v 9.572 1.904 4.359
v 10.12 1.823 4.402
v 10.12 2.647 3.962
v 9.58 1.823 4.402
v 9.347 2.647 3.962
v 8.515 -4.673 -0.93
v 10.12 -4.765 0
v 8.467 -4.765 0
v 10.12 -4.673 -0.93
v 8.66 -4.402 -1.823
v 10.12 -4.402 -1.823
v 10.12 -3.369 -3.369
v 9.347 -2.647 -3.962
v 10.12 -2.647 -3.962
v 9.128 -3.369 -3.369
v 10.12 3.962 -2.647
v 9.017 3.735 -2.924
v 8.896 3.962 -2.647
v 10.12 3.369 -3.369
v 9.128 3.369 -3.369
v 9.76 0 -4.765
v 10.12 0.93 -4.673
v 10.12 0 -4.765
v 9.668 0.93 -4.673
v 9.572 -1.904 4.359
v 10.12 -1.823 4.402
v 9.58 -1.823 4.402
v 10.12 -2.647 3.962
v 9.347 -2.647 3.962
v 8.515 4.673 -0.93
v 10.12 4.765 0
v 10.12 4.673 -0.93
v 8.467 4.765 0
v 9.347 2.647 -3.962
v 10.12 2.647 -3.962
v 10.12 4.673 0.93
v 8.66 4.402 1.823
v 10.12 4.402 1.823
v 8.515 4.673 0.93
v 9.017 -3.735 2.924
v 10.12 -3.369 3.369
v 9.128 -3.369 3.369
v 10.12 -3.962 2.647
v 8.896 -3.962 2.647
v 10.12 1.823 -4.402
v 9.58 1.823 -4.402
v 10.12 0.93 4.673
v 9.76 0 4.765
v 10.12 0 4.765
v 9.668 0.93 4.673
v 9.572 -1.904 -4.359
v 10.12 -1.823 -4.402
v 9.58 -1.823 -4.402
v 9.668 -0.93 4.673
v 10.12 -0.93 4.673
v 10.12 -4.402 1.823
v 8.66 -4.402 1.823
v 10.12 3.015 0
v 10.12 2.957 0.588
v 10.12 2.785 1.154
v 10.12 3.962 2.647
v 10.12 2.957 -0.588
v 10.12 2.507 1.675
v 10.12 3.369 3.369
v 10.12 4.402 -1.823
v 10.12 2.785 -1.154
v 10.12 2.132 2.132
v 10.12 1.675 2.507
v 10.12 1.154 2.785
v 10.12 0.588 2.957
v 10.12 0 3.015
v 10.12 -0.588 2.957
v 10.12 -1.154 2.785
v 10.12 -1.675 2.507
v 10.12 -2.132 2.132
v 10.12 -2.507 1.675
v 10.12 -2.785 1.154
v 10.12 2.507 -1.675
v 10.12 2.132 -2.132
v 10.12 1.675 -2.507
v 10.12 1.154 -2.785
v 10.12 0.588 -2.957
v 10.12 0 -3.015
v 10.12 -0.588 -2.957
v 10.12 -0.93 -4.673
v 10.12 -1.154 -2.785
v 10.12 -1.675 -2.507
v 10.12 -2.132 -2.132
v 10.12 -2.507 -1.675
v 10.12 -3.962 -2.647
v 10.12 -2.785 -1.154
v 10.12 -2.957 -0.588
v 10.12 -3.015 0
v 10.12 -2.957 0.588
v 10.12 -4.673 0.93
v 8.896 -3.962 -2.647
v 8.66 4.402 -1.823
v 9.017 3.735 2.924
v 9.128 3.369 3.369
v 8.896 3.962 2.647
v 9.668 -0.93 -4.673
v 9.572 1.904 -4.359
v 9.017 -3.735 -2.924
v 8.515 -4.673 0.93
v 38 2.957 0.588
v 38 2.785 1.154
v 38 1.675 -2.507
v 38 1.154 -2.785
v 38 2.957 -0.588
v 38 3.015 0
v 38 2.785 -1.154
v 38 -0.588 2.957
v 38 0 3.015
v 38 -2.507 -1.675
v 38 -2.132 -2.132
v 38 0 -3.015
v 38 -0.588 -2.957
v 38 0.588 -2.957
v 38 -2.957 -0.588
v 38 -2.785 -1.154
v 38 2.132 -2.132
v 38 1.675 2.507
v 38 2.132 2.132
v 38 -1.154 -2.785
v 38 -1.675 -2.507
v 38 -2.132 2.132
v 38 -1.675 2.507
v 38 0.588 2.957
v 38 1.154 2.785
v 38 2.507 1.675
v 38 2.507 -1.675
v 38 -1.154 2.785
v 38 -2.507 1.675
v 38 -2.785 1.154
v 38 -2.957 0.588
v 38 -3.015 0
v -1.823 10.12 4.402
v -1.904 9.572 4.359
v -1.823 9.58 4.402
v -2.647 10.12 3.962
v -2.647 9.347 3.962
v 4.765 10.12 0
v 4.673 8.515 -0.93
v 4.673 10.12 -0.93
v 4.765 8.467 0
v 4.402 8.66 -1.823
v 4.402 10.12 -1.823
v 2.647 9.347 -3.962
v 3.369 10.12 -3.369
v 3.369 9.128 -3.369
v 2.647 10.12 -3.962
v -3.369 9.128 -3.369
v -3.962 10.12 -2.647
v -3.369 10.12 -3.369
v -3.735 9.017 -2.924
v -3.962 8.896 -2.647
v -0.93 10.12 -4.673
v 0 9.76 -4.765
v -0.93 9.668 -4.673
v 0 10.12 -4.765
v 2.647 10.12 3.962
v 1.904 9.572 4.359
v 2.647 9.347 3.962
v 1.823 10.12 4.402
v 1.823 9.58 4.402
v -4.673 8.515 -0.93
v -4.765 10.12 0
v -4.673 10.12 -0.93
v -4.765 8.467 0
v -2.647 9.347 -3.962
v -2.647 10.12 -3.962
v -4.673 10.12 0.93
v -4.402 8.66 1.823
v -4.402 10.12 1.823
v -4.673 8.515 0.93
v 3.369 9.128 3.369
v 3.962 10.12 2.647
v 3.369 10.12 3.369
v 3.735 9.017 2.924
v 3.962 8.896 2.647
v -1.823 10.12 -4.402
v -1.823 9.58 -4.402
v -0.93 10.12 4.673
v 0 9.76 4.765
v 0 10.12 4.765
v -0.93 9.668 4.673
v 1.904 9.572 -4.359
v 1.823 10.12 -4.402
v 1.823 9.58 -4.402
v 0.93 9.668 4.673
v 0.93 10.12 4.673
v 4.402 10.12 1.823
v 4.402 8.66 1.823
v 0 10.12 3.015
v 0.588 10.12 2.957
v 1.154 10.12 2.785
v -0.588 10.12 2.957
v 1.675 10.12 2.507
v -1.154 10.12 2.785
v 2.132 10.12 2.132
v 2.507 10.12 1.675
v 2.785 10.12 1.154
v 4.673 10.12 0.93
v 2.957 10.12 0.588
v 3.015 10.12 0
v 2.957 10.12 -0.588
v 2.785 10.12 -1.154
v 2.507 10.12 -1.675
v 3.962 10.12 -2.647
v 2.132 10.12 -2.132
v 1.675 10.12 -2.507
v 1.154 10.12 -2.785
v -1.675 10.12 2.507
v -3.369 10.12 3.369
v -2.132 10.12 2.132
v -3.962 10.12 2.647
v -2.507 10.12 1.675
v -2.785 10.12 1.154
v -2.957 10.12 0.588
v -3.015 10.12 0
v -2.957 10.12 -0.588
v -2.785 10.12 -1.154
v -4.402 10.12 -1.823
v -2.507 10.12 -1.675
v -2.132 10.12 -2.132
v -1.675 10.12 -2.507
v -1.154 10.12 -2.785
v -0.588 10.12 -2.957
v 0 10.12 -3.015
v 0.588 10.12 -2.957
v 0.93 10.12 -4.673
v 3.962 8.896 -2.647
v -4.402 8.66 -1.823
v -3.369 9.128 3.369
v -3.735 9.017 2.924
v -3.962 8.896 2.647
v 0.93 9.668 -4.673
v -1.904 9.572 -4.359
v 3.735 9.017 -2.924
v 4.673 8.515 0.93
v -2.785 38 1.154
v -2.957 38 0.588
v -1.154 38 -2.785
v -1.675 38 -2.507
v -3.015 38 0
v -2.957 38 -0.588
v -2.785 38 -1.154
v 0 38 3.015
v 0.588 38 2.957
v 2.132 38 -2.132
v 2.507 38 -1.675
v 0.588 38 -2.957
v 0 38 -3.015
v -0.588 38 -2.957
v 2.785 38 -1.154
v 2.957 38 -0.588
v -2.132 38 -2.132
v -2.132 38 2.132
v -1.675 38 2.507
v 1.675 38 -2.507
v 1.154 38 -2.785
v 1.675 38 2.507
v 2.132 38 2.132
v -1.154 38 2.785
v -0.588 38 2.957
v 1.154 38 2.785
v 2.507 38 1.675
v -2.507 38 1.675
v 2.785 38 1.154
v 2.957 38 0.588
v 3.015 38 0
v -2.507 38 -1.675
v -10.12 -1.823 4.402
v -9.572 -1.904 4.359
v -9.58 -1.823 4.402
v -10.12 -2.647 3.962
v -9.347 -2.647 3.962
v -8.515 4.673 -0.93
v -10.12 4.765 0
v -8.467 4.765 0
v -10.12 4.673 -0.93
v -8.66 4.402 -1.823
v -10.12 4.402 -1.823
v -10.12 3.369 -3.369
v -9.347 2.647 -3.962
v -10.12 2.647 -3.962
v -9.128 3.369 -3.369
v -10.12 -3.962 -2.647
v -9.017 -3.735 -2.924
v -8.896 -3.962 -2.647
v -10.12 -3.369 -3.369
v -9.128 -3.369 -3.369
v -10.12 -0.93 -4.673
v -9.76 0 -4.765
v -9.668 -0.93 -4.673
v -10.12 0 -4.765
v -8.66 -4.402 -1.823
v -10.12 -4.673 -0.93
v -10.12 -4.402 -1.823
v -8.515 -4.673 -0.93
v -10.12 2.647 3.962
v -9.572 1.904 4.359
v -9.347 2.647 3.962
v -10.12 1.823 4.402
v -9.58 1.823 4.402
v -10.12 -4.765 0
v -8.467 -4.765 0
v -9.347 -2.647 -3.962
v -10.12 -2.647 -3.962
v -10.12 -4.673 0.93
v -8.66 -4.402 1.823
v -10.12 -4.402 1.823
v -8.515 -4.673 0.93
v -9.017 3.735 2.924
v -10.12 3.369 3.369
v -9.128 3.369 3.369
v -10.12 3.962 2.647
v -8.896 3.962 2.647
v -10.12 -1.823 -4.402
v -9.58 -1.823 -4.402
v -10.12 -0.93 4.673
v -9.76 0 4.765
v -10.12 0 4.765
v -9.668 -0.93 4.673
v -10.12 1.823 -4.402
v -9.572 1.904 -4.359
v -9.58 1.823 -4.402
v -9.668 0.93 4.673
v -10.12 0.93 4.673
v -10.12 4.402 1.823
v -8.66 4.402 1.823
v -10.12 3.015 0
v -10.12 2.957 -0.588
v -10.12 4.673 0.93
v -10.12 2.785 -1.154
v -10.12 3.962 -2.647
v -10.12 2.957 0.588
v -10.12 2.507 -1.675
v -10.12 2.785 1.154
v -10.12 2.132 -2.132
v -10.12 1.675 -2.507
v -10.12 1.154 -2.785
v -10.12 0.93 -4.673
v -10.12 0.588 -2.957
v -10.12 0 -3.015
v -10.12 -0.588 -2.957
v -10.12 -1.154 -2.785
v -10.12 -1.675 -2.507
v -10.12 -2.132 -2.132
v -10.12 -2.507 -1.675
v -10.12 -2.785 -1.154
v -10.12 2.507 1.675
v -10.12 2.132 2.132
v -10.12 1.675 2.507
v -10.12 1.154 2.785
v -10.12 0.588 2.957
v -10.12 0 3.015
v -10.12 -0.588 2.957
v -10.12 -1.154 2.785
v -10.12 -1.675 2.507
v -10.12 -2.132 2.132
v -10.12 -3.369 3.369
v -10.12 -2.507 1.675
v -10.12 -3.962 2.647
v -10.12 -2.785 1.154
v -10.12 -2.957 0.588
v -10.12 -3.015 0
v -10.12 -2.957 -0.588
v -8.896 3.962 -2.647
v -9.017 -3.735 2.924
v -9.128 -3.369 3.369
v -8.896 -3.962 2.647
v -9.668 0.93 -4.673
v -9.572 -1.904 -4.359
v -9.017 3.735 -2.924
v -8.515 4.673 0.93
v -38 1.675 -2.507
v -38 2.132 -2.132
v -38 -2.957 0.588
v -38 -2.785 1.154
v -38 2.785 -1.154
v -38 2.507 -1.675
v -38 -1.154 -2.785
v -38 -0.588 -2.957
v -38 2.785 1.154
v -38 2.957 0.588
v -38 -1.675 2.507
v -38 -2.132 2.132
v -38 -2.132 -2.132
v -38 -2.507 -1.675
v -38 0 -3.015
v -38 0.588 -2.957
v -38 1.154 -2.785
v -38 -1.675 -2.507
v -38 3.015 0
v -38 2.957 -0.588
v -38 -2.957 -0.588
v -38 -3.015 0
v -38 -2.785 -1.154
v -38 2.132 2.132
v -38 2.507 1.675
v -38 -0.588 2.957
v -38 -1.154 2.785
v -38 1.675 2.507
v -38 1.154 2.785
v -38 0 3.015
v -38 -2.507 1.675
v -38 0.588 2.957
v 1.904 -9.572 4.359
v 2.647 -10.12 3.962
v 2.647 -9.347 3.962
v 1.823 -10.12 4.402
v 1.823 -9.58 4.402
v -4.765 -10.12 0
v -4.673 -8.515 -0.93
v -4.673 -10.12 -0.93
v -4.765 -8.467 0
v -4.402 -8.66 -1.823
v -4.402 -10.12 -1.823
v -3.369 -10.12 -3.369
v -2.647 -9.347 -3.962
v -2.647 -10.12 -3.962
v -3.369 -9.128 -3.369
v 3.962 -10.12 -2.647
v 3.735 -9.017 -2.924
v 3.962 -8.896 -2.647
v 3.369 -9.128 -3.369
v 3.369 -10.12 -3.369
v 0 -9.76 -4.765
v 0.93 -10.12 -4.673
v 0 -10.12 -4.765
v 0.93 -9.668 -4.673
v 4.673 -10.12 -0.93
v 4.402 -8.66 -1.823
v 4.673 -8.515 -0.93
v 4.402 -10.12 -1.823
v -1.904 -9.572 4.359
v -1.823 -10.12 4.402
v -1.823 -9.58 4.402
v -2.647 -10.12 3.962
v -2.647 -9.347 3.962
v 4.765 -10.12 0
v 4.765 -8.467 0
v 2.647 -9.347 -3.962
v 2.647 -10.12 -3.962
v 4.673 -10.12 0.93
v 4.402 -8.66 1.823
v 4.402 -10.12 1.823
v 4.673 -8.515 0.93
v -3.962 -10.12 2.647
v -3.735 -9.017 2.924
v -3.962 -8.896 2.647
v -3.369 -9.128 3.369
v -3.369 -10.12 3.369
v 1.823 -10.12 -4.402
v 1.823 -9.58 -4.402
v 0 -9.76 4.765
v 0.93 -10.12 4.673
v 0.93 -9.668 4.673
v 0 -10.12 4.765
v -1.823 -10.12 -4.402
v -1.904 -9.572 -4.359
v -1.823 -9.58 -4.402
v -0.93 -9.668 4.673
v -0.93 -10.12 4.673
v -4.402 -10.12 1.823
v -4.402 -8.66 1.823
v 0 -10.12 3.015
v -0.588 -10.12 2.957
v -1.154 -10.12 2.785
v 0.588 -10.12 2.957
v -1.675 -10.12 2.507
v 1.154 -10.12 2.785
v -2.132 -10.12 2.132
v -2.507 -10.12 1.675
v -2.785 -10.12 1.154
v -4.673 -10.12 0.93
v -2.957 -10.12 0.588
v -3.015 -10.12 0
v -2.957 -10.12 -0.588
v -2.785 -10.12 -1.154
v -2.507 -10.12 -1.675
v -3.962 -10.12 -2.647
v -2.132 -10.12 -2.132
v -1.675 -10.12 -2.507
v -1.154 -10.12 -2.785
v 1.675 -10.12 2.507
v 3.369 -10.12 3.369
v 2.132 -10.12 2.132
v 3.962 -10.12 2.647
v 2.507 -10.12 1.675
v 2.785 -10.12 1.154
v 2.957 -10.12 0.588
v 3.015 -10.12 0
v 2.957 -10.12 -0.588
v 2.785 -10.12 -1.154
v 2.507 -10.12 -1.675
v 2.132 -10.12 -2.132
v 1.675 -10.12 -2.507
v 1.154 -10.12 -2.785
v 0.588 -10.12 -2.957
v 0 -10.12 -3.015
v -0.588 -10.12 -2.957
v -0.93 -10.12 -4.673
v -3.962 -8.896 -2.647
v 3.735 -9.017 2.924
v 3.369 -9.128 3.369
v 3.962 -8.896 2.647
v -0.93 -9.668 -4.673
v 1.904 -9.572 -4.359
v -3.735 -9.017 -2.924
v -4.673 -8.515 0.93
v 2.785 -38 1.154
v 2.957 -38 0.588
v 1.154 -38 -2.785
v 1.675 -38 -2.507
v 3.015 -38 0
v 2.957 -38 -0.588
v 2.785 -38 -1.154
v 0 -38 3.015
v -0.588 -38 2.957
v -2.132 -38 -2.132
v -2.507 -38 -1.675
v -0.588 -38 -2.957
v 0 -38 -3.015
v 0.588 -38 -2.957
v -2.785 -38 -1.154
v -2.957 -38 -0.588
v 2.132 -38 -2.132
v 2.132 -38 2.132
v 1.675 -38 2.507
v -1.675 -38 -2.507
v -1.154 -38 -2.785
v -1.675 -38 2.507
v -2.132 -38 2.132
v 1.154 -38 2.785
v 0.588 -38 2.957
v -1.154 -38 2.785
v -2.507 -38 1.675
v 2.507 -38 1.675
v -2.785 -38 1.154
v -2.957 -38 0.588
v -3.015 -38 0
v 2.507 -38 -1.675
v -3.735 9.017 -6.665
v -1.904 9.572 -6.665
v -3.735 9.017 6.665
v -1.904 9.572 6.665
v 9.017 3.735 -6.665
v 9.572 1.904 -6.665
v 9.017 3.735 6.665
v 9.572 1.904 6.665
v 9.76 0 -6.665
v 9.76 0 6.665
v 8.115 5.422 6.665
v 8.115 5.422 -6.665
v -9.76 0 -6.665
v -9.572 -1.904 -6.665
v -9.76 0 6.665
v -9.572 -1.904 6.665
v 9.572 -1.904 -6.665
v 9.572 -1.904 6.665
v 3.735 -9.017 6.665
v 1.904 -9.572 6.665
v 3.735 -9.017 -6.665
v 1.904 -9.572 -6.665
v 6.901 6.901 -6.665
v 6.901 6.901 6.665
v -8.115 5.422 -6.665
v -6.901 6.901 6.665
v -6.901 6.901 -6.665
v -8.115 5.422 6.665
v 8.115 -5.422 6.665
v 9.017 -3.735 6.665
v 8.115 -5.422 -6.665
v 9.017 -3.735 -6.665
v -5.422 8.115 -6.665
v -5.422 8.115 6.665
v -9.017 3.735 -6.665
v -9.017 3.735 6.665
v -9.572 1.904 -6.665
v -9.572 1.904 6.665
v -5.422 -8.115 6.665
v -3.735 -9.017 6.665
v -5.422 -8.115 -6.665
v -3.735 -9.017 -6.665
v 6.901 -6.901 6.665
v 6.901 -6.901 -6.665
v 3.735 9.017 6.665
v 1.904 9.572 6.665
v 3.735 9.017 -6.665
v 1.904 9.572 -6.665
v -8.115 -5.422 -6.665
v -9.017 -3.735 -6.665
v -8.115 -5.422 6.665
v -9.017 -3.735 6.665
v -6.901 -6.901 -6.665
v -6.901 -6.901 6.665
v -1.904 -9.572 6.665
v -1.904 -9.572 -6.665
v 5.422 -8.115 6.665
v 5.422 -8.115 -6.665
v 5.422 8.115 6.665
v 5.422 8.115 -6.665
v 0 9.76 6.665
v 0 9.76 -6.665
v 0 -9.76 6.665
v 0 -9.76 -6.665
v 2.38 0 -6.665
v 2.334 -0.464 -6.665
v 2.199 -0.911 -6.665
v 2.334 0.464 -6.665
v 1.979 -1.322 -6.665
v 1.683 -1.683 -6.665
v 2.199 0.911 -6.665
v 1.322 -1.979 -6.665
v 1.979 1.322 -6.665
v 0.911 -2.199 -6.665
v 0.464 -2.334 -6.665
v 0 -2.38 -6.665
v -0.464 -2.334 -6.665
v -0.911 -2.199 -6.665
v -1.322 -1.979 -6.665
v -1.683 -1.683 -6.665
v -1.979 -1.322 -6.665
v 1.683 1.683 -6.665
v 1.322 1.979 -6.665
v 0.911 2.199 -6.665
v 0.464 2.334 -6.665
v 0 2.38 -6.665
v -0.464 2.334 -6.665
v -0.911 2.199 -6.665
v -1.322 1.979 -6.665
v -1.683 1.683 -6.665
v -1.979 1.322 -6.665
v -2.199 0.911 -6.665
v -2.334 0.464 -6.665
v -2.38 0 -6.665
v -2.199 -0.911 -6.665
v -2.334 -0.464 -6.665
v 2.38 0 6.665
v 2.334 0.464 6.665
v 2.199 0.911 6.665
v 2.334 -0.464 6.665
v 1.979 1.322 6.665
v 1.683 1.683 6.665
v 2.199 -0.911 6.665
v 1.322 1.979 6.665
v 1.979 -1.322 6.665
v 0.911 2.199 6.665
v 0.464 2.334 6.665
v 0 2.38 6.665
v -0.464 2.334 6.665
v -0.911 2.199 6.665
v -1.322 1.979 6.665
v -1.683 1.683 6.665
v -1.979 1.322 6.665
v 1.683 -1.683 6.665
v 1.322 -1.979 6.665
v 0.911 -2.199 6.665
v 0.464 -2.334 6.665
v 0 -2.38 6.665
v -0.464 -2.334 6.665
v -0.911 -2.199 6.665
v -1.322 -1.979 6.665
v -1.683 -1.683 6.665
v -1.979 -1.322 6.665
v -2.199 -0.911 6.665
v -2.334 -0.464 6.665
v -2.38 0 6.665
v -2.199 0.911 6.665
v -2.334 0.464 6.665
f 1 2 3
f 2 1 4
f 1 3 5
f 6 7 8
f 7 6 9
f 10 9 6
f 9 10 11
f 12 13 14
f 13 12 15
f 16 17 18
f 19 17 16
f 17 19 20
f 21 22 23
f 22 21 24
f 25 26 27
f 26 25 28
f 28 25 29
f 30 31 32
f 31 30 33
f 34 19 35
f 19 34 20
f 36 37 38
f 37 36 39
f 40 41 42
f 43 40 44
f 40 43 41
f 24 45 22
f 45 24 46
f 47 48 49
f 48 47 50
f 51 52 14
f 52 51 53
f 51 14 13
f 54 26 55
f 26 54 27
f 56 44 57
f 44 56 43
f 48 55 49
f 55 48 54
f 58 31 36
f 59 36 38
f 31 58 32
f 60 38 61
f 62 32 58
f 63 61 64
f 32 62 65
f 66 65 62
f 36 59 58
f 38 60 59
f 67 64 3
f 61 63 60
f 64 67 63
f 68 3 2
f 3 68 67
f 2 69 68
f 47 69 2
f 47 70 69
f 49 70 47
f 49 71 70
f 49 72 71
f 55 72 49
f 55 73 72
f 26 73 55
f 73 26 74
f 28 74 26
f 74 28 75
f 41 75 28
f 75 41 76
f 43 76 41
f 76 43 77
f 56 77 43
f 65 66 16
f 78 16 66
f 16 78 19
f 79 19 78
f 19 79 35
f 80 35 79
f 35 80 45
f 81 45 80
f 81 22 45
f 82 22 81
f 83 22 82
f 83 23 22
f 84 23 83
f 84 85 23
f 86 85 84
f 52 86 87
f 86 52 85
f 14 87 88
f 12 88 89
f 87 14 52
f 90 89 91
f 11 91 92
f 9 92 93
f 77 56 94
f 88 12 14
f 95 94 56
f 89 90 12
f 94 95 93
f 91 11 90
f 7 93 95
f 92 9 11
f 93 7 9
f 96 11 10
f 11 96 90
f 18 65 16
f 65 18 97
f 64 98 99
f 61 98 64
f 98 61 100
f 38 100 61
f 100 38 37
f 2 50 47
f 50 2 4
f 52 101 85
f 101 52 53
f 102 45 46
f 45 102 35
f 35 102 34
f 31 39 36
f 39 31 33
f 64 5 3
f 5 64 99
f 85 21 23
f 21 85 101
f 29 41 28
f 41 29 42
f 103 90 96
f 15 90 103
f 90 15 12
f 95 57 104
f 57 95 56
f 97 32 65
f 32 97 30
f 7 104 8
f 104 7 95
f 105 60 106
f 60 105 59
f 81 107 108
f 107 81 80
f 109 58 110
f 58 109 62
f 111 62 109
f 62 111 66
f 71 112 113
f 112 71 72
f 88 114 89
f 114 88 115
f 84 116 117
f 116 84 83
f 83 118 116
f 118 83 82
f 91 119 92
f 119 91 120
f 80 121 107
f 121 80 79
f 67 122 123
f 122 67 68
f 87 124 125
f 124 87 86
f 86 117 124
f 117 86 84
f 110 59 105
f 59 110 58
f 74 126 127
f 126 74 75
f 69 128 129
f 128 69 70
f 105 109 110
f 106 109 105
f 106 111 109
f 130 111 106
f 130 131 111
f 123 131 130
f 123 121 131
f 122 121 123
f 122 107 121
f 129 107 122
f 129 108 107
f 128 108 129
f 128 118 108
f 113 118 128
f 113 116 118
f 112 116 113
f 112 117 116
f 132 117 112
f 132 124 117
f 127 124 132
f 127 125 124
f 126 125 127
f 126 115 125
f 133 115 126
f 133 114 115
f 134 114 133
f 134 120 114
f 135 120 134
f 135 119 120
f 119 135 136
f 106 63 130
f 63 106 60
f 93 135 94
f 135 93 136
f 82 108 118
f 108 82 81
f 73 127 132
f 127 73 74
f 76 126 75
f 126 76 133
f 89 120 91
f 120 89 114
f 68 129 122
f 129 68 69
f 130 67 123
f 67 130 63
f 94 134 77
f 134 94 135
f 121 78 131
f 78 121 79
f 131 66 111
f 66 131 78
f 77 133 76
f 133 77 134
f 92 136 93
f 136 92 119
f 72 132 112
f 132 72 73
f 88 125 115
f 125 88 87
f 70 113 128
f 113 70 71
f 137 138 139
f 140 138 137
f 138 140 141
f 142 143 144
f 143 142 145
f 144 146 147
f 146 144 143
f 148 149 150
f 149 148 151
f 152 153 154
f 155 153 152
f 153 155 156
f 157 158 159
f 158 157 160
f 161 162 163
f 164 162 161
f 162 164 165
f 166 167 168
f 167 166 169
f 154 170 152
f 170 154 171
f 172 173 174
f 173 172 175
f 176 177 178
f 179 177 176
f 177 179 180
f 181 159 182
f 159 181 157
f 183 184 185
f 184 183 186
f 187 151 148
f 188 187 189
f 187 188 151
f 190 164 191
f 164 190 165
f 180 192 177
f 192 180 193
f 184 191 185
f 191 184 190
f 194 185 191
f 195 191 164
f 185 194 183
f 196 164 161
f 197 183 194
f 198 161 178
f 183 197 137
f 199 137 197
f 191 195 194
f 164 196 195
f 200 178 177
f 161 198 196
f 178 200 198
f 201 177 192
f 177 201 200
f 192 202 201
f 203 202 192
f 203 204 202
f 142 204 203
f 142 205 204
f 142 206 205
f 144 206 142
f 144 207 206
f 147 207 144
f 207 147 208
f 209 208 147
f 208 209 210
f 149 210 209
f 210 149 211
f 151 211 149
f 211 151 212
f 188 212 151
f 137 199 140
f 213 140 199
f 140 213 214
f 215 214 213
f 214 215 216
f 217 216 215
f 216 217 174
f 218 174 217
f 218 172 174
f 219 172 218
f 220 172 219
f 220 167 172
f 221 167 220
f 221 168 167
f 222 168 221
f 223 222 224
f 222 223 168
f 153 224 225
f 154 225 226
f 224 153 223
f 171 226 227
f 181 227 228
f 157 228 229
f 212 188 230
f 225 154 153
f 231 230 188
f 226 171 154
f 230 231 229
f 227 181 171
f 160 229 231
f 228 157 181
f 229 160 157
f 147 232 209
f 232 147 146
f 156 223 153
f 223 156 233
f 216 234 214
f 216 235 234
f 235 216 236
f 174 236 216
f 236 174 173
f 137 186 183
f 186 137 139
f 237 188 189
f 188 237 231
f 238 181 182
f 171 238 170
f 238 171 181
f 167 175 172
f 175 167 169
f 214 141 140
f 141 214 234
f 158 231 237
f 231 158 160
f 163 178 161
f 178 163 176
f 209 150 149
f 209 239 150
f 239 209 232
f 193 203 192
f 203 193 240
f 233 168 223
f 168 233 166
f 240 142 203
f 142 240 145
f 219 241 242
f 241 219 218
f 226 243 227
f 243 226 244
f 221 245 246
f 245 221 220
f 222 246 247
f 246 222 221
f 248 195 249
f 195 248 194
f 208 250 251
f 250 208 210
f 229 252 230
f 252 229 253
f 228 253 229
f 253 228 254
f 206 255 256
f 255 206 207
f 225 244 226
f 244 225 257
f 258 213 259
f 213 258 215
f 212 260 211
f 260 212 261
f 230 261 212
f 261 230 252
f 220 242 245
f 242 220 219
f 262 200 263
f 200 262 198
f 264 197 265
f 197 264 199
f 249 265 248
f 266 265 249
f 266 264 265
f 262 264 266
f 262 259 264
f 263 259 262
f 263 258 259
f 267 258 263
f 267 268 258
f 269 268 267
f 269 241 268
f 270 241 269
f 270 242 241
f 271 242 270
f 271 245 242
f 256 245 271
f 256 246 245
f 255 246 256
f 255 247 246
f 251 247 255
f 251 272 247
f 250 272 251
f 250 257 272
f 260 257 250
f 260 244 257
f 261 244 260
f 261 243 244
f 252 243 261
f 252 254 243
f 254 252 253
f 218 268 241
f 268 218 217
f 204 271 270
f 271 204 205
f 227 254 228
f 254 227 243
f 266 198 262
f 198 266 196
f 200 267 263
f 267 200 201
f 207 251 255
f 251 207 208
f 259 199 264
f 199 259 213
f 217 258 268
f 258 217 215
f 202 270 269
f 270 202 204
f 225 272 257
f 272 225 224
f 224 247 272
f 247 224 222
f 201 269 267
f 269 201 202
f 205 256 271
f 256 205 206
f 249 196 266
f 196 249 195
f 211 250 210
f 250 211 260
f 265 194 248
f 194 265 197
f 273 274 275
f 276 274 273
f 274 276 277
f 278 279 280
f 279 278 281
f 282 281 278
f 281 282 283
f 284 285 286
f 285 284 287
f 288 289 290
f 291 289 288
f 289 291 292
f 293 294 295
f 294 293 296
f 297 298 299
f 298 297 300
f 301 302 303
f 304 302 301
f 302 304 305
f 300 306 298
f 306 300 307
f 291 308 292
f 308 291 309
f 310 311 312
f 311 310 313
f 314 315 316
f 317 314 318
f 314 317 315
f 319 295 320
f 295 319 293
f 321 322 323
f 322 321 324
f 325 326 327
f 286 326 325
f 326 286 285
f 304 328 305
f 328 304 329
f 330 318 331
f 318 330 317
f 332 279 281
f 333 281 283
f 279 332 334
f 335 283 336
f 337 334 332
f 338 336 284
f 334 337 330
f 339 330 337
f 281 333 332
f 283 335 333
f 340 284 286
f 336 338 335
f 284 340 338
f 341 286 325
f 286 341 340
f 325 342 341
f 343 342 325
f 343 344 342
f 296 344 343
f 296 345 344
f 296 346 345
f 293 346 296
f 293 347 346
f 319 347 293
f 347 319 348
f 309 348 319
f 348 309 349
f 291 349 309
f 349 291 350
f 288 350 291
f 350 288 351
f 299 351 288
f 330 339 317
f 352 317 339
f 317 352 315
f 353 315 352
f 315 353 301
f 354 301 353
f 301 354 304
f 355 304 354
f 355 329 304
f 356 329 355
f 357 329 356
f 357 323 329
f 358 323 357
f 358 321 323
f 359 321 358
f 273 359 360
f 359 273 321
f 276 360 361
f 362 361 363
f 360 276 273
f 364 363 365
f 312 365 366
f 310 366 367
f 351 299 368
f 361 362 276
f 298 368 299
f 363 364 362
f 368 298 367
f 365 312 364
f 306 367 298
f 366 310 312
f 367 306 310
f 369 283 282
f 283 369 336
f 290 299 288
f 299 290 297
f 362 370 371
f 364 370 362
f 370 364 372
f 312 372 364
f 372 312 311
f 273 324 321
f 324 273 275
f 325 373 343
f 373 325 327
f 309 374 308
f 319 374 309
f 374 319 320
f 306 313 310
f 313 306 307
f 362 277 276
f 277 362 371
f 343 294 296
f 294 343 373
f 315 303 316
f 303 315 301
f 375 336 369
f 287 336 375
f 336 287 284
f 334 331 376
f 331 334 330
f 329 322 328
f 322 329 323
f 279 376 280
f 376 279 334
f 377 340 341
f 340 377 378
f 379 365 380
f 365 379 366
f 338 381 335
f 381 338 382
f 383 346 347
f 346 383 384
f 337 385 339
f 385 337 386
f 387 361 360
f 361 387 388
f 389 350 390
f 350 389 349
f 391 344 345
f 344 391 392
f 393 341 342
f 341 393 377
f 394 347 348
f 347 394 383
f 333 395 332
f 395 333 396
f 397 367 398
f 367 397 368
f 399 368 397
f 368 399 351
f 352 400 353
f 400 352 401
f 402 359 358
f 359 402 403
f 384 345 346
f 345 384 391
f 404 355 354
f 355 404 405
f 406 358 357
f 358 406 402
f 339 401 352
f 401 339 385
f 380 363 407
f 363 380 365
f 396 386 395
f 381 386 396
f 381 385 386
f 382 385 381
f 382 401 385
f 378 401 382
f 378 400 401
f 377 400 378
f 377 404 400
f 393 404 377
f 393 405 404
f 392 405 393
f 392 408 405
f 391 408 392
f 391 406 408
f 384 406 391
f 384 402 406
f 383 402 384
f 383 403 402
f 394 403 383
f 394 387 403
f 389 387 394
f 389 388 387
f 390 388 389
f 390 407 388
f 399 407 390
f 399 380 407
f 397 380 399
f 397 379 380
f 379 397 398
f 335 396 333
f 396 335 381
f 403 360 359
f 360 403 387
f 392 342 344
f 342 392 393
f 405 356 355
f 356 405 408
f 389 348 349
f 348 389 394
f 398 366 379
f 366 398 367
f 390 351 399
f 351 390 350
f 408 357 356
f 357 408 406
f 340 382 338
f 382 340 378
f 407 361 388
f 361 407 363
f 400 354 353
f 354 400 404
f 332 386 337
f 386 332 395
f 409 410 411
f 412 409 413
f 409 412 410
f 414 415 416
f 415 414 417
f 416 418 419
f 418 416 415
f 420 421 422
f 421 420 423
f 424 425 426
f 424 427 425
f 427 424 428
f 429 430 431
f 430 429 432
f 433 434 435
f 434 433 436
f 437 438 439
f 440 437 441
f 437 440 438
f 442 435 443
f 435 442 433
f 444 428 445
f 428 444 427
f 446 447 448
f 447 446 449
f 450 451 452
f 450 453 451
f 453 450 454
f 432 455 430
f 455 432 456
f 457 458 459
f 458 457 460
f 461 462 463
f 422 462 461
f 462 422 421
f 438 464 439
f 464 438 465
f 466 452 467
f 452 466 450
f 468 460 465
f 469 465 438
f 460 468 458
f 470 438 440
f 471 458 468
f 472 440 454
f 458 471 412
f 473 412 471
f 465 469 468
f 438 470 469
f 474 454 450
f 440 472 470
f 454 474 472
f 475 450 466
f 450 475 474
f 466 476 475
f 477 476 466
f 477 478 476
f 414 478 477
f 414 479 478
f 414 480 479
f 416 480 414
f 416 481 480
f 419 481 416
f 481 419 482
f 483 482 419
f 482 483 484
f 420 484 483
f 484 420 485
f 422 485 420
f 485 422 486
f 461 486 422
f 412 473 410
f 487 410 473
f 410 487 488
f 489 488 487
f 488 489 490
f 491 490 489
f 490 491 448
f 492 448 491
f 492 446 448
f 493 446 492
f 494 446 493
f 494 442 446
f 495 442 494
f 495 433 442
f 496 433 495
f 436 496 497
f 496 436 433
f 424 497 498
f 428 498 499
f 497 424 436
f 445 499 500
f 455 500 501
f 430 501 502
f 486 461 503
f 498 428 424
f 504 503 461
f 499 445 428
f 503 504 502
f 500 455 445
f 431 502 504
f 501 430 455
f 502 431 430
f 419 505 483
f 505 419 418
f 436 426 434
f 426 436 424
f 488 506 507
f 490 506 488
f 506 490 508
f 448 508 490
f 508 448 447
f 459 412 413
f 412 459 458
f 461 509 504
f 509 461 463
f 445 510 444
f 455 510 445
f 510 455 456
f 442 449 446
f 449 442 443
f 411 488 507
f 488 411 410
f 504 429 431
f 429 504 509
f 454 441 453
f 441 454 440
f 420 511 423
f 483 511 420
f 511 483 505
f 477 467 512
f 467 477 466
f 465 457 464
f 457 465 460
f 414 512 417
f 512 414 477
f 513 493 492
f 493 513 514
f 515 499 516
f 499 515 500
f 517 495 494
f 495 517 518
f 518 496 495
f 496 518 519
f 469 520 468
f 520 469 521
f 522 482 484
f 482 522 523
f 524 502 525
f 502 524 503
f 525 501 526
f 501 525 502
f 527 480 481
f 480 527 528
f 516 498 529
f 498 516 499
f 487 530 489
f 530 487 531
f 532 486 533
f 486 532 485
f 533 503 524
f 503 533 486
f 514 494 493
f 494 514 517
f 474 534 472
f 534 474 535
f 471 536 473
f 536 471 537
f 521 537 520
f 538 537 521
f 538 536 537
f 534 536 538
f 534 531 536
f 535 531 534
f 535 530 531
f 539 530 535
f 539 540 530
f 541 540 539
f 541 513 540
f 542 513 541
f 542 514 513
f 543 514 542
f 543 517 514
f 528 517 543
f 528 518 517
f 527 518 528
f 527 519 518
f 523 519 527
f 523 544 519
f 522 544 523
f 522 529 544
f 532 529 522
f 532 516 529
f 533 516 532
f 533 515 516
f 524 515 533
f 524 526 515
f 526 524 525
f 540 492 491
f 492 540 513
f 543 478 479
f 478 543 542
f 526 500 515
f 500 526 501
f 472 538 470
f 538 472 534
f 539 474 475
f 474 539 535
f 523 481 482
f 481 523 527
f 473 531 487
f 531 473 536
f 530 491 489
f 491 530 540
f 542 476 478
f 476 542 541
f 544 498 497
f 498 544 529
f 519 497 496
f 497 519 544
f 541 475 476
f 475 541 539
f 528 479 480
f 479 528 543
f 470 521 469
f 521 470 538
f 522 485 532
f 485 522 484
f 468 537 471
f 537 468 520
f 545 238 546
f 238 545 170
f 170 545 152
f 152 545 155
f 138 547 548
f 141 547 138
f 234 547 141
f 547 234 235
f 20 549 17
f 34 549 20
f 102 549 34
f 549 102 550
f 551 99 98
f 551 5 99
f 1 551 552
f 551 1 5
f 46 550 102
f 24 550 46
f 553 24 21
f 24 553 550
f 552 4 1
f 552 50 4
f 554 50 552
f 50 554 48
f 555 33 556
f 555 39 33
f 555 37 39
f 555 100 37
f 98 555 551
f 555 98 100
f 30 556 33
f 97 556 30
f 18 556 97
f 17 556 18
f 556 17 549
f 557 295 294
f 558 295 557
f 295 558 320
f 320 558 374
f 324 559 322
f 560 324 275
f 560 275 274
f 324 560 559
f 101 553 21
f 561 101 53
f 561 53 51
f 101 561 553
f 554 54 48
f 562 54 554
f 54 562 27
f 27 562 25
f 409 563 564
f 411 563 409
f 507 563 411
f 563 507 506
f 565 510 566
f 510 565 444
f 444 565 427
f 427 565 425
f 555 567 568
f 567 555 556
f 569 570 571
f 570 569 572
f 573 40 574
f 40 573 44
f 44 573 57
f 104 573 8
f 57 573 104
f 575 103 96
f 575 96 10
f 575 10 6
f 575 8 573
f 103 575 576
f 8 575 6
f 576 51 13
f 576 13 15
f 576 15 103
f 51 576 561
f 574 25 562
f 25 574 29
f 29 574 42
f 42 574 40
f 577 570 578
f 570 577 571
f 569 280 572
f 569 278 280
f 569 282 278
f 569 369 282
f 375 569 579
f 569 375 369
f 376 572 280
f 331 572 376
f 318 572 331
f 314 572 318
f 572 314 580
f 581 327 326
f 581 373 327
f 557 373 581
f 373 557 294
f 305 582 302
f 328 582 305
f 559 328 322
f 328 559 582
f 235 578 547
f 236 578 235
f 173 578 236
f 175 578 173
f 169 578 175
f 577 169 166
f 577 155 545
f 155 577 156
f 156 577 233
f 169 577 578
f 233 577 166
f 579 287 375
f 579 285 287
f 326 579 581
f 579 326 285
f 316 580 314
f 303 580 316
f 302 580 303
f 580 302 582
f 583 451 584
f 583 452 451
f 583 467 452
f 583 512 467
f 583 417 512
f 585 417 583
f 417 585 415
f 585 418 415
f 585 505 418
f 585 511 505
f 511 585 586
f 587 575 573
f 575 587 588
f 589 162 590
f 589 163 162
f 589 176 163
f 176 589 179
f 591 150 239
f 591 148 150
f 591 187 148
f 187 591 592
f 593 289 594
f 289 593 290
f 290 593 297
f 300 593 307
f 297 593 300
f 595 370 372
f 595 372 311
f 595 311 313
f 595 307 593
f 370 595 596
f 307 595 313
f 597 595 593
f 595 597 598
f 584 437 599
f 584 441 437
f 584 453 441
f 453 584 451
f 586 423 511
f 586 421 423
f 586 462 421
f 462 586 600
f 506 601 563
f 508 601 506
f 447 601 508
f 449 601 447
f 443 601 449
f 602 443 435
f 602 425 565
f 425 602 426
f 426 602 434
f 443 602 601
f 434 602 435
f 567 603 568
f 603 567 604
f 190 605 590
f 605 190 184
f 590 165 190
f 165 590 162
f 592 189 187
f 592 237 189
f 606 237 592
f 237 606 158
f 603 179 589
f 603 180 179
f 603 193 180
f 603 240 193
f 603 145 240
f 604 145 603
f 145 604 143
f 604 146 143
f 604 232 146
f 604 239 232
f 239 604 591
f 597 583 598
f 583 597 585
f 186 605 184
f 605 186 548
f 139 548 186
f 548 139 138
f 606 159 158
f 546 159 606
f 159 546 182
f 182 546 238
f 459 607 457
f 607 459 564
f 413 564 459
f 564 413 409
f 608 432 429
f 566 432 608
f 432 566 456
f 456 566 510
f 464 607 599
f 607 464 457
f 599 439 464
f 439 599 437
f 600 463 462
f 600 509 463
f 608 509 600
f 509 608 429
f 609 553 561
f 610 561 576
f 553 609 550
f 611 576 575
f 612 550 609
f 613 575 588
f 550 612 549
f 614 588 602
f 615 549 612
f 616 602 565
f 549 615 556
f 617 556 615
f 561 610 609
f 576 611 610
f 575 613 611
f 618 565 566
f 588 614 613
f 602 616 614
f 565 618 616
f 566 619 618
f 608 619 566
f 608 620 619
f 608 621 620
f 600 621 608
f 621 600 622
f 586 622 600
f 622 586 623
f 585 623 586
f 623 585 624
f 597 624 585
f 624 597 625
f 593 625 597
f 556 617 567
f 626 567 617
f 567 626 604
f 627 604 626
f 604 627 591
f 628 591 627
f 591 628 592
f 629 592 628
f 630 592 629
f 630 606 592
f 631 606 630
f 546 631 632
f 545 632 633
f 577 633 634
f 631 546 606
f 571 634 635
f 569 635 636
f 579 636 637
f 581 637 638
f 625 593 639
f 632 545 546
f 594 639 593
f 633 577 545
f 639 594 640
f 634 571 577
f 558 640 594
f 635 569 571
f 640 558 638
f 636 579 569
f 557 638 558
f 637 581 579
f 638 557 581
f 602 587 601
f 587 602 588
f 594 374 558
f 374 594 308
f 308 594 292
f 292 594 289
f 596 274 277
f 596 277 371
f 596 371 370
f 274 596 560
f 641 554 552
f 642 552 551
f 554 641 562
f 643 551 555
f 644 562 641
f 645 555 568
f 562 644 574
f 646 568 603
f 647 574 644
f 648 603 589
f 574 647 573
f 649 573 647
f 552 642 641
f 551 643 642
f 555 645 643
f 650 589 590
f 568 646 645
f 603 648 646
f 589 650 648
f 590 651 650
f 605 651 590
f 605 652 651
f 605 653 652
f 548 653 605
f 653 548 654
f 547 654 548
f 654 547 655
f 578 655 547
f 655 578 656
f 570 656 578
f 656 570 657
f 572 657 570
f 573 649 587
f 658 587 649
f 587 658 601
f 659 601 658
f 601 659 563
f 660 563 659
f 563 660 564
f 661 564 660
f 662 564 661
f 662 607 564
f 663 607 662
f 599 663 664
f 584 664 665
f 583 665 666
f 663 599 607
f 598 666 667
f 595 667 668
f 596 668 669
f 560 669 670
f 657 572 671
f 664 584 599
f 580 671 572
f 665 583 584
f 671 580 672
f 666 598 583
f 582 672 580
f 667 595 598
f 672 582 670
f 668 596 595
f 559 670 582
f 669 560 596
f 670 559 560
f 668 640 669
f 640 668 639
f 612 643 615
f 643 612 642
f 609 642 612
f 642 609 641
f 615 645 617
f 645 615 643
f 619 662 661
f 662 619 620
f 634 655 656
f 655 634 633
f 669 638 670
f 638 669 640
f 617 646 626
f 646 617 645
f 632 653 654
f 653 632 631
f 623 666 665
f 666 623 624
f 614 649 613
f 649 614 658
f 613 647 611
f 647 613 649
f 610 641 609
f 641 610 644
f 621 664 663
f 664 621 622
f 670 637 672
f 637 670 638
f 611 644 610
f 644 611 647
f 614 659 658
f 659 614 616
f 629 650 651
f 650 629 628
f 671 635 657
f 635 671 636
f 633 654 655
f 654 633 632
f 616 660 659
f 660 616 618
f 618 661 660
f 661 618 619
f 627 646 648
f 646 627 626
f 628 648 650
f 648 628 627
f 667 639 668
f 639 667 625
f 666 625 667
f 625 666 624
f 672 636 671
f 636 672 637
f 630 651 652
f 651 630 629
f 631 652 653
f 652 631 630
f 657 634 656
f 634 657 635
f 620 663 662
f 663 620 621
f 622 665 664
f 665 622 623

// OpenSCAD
$fn = 32;

// ----------------------------------------------------------------------
// Cardan cross: 76 mm span, 9.53 mm trunnions
// ----------------------------------------------------------------------

// --- parameters (mm) ---
journal_d = 9.53;         // trunnion diameter
arm_len = 38;             // trunnion length from the centre
step_r = 3.24;            // step position from the centre
step_d = 6.03;            // journal diameter after the step
hub_d = 19.52;            // hub diameter
hub_h = 13.33;            // hub height
bore_d = 4.76;            // hub bore

difference() {
  union() {
    /* hub along the joint axis */
    cylinder(h = hub_h, d = hub_d, center = true);
    for (a = [0 : 90 : 270]) rotate([0, 0, a]) {
      /* trunnion, sunk into the hub */
      translate([hub_d / 4, 0, 0]) rotate([0, 90, 0]) cylinder(h = step_r + 2, d = journal_d);
      /* stepped journal out to the tip */
      translate([step_r - 0.5, 0, 0]) rotate([0, 90, 0]) cylinder(h = arm_len + 0.5 - step_r, d = step_d);
    }
  }
  /* lubrication bore through the hub, 2.5 mm clear on both sides */
  translate([0, 0, -hub_h / 2 - 2.5]) cylinder(h = hub_h + 5, d = bore_d);
}
